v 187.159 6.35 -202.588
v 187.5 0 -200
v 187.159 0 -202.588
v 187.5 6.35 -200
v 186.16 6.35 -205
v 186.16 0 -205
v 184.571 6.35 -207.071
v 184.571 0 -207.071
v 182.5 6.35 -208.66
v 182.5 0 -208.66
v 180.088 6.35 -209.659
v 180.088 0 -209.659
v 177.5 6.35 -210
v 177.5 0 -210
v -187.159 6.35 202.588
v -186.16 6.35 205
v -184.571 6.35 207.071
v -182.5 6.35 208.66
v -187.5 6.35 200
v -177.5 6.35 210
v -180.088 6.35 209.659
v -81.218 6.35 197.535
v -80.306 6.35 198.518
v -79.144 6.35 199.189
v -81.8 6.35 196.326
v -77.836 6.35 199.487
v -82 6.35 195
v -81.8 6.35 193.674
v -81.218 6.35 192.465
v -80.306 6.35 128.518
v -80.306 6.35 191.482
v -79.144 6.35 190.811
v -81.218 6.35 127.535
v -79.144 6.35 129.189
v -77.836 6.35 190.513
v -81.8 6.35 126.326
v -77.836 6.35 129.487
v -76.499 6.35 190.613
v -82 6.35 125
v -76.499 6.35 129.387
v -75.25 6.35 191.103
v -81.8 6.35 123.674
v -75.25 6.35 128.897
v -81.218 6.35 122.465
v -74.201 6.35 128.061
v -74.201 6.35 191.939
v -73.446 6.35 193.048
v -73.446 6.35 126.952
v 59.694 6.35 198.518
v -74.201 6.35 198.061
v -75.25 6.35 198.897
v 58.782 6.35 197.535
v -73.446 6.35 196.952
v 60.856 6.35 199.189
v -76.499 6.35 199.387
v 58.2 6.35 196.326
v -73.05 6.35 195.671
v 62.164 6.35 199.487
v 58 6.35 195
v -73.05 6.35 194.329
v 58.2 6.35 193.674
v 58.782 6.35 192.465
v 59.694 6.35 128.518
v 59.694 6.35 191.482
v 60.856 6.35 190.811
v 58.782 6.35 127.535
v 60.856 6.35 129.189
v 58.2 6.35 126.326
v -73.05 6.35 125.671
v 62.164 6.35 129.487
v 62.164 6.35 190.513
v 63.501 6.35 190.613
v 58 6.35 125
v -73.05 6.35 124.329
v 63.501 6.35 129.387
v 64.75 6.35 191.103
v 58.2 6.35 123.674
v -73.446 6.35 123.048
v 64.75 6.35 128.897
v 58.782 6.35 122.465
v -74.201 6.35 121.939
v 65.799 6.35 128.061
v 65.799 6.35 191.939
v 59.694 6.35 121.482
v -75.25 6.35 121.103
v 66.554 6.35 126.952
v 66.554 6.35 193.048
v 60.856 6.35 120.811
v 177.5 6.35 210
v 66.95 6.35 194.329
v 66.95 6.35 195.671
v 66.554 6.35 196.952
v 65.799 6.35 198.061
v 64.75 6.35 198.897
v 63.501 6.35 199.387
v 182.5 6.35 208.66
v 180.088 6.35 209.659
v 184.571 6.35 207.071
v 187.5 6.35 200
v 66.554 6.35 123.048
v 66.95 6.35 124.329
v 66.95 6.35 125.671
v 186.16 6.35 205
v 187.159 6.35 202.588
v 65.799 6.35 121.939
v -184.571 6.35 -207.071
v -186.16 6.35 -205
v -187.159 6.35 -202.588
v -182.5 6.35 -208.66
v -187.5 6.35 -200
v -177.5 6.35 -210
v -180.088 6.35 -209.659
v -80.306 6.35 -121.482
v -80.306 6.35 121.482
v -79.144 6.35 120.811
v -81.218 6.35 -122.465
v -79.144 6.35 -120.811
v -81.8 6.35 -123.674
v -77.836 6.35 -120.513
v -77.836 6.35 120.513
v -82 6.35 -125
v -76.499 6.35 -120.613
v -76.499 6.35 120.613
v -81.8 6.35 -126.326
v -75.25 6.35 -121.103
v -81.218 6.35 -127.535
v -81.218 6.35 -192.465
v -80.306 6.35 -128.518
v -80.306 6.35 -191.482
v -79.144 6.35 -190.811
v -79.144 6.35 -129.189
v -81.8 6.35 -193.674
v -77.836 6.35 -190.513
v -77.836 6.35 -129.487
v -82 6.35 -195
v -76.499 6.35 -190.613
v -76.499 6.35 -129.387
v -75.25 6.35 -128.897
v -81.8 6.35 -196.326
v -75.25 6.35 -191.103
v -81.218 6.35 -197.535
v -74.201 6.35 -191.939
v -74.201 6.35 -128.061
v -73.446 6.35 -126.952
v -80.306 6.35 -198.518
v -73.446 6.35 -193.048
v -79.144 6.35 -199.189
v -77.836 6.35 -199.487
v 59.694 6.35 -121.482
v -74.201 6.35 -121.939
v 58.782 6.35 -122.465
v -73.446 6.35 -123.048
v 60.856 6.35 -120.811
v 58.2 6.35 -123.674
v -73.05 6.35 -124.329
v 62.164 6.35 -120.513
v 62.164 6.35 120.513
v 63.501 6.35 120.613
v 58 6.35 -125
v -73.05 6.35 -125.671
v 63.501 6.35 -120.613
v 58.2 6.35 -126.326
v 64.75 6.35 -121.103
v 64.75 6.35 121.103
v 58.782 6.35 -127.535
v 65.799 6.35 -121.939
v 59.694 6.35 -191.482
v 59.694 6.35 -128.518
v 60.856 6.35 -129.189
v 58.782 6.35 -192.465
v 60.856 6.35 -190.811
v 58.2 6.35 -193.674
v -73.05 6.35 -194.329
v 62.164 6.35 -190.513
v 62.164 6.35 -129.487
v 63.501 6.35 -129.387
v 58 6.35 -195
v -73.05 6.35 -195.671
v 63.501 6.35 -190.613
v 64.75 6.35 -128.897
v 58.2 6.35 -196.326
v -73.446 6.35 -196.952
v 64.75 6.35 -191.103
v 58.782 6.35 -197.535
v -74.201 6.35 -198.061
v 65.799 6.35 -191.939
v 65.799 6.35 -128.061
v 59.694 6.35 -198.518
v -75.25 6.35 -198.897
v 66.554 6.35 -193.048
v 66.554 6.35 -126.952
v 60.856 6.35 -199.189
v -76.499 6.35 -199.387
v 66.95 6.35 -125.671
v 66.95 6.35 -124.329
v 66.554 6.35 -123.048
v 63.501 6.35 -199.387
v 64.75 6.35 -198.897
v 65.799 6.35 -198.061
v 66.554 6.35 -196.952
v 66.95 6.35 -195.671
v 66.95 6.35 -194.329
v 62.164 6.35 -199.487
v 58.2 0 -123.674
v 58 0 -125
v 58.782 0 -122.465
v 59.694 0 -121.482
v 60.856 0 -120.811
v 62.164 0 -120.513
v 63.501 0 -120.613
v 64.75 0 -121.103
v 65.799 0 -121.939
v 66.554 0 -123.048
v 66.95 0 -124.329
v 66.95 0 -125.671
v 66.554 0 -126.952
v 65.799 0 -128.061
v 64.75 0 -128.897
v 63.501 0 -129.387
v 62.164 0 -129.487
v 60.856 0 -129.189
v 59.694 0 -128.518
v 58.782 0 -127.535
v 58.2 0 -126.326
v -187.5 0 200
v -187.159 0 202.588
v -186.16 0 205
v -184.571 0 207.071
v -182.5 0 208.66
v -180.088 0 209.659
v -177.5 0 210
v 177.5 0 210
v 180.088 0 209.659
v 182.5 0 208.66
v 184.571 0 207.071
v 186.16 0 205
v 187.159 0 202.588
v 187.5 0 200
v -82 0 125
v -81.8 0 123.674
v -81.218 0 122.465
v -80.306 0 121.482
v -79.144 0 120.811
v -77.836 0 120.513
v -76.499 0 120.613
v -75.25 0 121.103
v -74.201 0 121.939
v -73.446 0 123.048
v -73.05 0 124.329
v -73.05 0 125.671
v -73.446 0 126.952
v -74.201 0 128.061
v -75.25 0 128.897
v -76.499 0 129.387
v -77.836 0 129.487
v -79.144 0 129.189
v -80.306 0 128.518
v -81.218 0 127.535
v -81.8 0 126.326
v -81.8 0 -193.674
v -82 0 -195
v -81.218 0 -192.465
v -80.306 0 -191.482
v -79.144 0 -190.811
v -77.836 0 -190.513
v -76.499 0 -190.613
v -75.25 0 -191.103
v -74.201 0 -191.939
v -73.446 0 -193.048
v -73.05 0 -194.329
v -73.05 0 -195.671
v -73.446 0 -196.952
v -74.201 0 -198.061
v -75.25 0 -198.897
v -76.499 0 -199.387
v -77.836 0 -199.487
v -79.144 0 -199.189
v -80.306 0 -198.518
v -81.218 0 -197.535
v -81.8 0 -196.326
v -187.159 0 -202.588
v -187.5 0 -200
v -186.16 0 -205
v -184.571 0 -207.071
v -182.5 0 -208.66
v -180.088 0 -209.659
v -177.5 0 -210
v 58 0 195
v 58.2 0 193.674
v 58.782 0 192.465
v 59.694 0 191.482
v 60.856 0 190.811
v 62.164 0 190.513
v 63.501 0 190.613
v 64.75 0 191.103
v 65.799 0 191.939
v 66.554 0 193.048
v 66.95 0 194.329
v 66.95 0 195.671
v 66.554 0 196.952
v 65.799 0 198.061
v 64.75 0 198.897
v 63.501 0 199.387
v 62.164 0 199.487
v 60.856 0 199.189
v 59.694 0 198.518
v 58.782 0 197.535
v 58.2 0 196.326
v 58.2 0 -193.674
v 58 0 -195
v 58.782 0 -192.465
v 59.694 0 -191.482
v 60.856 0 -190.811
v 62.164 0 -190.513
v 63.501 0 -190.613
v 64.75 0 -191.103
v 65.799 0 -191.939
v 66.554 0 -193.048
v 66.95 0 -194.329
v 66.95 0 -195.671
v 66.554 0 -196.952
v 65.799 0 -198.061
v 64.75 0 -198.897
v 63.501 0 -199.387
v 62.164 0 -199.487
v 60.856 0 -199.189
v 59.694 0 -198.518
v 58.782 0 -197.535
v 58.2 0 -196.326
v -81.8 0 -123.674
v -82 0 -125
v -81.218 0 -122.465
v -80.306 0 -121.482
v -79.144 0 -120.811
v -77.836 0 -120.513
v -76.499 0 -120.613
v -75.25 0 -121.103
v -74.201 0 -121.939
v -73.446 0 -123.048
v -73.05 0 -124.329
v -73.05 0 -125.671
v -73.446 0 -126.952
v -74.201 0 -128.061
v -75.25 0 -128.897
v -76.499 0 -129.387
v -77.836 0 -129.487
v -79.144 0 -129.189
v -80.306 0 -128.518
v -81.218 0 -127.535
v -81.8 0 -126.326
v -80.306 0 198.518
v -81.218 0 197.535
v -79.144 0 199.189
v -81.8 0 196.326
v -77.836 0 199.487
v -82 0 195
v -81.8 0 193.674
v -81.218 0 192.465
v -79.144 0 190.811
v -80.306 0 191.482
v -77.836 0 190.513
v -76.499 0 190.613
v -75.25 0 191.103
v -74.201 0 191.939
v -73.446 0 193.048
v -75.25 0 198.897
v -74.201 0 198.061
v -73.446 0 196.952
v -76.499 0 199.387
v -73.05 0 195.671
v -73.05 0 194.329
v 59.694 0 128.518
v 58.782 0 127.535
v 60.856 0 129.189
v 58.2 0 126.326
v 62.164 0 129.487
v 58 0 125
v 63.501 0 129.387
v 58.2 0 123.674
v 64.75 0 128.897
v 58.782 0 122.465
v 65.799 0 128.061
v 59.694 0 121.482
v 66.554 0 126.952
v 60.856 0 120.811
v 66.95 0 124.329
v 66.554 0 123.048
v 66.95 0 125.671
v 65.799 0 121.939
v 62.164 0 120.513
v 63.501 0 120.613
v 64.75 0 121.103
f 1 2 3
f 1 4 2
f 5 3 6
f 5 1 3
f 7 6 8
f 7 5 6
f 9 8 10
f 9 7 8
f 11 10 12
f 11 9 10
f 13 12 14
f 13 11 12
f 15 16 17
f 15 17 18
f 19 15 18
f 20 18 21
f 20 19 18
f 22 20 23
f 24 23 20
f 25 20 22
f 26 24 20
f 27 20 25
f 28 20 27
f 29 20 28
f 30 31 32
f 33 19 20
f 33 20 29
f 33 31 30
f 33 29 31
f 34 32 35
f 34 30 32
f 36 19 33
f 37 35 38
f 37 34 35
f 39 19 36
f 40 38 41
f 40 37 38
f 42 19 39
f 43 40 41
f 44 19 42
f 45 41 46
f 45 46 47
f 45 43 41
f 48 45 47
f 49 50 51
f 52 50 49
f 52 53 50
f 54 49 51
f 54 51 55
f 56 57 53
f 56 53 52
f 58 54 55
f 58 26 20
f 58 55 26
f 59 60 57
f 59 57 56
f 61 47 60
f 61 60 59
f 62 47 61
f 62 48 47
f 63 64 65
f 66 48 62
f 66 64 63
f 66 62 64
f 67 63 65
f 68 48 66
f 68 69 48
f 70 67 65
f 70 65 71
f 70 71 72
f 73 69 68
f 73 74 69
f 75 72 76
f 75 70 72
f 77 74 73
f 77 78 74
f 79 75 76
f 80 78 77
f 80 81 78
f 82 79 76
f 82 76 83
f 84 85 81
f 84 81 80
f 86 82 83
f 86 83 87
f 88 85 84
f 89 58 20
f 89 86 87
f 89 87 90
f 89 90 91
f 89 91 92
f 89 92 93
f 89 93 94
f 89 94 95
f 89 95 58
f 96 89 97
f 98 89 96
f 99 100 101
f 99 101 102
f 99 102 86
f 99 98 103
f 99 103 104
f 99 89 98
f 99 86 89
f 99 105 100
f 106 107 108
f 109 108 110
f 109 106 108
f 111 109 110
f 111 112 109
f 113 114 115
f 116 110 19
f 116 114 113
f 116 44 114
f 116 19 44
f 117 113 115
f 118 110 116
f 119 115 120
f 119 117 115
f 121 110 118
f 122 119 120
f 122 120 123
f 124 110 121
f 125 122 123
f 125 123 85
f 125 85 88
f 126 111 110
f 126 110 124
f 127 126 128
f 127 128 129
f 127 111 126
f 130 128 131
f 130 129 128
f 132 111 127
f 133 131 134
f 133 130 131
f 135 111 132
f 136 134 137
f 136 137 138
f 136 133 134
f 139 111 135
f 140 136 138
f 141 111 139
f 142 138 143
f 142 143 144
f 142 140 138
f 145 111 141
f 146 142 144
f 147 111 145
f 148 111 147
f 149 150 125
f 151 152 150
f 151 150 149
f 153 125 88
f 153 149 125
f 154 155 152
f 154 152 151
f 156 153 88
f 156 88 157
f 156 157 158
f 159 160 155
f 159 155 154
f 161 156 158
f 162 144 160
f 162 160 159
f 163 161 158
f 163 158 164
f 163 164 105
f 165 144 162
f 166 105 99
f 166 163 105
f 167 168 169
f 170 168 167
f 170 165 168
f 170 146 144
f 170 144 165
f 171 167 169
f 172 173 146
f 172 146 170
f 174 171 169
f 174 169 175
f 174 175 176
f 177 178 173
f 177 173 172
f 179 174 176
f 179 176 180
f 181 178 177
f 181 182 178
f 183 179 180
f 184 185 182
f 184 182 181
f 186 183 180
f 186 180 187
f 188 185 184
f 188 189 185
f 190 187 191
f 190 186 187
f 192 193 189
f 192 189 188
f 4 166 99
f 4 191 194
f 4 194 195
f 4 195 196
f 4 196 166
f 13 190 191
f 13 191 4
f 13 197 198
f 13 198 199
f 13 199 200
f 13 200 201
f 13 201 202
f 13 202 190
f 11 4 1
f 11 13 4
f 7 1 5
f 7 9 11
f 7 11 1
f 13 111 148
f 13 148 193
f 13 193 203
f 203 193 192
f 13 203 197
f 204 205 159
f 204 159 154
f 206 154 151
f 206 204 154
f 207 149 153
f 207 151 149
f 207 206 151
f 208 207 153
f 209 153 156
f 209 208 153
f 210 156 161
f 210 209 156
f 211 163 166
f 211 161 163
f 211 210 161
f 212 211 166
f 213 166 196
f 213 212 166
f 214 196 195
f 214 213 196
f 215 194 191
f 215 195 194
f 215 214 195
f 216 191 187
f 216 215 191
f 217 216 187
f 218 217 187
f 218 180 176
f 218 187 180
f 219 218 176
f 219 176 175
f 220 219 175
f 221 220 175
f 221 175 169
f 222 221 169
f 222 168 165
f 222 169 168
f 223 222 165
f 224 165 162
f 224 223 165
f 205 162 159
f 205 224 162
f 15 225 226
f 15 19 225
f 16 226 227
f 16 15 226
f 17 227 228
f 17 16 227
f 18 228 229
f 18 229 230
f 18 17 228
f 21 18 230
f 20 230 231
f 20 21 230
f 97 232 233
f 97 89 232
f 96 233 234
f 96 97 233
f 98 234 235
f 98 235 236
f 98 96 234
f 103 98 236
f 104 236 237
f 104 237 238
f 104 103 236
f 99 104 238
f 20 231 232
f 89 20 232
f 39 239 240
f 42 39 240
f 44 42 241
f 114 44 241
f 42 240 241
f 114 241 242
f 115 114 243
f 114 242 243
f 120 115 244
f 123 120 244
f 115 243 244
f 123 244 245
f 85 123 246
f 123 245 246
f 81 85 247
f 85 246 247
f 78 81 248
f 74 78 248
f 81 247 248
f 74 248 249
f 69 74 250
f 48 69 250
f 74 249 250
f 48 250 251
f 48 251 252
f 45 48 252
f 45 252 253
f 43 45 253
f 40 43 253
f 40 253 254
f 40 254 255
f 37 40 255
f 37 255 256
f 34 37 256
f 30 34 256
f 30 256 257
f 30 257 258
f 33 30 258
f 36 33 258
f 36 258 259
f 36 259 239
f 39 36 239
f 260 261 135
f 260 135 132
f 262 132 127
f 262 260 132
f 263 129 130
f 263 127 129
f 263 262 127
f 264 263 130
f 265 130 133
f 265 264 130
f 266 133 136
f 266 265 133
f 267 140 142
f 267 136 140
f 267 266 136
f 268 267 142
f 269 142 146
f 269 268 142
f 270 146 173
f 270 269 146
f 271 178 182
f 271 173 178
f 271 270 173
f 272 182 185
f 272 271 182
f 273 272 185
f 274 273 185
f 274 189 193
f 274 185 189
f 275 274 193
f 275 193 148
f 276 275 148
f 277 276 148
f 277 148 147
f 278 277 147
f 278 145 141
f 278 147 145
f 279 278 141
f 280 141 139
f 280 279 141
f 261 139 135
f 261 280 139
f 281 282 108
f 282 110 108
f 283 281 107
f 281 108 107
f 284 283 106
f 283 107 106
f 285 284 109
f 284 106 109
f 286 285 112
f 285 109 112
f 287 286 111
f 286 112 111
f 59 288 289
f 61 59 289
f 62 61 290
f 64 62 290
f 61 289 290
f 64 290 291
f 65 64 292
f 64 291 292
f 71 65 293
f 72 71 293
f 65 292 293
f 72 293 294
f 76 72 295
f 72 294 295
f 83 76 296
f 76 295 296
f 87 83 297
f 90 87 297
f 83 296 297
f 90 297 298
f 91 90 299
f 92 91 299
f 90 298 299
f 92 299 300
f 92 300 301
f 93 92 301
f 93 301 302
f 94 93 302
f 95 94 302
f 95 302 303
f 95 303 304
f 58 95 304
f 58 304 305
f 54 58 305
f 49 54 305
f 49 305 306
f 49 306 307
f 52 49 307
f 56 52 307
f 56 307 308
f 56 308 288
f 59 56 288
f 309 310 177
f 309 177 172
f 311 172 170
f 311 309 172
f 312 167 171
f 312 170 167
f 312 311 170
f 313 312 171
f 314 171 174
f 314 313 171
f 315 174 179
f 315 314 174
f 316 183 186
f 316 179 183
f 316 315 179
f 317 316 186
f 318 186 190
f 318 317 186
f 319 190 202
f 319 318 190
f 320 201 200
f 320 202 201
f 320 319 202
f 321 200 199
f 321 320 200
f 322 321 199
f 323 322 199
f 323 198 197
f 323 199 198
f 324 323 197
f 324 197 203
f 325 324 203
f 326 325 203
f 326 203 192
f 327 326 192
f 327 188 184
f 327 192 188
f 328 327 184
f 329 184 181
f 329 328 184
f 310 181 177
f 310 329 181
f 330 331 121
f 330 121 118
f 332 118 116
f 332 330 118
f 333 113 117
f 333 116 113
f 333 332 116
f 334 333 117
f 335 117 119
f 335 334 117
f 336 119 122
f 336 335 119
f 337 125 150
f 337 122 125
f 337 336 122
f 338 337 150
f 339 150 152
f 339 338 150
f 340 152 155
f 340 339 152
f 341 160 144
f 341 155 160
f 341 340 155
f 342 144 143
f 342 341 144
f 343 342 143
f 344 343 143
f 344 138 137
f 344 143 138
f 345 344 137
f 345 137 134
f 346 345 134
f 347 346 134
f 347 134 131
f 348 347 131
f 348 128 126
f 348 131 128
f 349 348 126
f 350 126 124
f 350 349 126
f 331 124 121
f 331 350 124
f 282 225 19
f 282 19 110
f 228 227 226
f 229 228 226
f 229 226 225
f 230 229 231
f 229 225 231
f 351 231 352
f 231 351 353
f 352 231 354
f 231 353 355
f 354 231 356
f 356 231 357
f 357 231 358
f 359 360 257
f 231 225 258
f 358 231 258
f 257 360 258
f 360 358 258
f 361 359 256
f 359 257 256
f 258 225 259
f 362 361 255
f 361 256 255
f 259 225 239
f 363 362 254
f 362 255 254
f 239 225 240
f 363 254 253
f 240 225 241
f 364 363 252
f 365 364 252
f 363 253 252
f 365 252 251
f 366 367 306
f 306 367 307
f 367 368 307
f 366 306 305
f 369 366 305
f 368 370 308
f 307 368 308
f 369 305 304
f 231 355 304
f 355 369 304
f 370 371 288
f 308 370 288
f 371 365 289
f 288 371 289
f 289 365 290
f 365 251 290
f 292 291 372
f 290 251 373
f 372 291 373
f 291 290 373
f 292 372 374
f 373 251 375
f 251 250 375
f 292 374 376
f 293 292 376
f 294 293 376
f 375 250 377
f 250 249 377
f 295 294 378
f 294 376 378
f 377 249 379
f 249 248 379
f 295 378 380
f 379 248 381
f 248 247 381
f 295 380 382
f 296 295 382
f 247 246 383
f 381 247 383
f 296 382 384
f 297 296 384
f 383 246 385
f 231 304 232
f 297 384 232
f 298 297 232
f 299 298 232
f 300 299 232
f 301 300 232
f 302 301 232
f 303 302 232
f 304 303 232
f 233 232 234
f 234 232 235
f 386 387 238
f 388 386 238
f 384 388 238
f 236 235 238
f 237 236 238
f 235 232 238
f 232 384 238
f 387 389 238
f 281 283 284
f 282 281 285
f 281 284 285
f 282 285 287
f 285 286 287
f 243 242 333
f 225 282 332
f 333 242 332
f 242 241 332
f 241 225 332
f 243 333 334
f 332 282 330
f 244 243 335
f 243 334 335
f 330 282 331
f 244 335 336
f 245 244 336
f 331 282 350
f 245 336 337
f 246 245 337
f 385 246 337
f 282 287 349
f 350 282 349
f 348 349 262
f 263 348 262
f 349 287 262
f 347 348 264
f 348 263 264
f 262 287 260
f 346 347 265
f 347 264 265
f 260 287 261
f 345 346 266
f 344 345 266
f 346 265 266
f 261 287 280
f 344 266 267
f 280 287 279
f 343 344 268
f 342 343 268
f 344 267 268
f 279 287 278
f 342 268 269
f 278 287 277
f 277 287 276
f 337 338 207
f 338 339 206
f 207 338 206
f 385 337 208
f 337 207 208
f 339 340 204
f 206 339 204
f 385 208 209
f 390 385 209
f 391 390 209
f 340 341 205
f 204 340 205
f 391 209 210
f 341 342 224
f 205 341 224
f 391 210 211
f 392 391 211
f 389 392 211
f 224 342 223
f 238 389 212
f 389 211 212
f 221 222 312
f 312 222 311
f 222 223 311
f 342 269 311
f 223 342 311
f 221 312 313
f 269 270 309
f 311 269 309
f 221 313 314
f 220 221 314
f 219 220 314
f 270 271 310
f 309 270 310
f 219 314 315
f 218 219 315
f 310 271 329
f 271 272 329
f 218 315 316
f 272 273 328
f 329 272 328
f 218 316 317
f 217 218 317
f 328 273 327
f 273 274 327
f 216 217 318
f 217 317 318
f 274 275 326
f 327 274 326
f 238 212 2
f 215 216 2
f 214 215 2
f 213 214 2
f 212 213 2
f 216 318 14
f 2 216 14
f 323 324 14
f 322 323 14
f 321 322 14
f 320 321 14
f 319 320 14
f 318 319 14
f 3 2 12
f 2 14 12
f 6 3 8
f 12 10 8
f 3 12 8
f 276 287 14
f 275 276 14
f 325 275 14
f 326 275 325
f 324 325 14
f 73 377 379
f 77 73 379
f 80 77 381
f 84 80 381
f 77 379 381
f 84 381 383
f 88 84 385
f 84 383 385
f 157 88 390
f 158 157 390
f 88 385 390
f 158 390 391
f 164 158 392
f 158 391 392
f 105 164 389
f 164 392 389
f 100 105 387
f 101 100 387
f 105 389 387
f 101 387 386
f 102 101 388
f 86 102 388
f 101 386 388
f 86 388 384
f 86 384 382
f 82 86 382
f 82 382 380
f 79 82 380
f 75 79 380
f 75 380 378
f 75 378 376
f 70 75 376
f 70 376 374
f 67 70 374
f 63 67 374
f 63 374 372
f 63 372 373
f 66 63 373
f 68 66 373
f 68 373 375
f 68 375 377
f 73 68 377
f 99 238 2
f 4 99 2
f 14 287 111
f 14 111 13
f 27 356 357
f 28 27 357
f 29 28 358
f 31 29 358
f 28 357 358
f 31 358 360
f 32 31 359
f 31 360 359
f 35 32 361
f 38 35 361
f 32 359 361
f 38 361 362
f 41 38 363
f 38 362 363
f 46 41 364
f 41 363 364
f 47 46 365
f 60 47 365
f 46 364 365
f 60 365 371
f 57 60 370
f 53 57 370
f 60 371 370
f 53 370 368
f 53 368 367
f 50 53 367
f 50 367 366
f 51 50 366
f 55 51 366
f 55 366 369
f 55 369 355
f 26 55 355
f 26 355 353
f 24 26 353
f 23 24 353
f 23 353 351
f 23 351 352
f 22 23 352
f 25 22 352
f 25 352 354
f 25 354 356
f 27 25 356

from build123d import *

# Parameters (mm, degrees)
SKETCH1_W            = 375
SKETCH1_H            = 420
BOSS_EXTRUDE1_DEPTH  = 6.35
FILLET1_R            = 10
M8_CLEARANCE_HOLE1_D = 9


with BuildPart() as part:
    # Sketch1 → Boss-Extrude1 (new body)
    with BuildSketch(Plane(origin=(0, 0, 0), x_dir=(1, 0, 0), z_dir=(0, 1, 0))):
        Rectangle(SKETCH1_W, SKETCH1_H)
    extrude(amount=BOSS_EXTRUDE1_DEPTH)

    # Fillet1
    fillet1_edges = [part.edges().sort_by_distance(p)[0] for p in [
        (187.5, 3.175, 210),
        (-187.5, 3.175, 210),
        (-187.5, 3.175, -210),
        (187.5, 3.175, -210),
    ]]
    fillet(fillet1_edges, radius=FILLET1_R)

    # M8 Clearance Hole1 (through all)
    with Locations(Plane(origin=(0, 6.35, 0), x_dir=(1, 0, 0), z_dir=(0, 1, 0))):
        with Locations((-77.5, -195), (62.5, -125), (-77.5, -125), (62.5, -195)):
            m8_clearance_hole1 = Hole(M8_CLEARANCE_HOLE1_D / 2)

    # Mirror1: M8 Clearance Hole1 across plane
    add(m8_clearance_hole1.mirror(Plane.XY), mode=Mode.SUBTRACT)


solid = part.part
